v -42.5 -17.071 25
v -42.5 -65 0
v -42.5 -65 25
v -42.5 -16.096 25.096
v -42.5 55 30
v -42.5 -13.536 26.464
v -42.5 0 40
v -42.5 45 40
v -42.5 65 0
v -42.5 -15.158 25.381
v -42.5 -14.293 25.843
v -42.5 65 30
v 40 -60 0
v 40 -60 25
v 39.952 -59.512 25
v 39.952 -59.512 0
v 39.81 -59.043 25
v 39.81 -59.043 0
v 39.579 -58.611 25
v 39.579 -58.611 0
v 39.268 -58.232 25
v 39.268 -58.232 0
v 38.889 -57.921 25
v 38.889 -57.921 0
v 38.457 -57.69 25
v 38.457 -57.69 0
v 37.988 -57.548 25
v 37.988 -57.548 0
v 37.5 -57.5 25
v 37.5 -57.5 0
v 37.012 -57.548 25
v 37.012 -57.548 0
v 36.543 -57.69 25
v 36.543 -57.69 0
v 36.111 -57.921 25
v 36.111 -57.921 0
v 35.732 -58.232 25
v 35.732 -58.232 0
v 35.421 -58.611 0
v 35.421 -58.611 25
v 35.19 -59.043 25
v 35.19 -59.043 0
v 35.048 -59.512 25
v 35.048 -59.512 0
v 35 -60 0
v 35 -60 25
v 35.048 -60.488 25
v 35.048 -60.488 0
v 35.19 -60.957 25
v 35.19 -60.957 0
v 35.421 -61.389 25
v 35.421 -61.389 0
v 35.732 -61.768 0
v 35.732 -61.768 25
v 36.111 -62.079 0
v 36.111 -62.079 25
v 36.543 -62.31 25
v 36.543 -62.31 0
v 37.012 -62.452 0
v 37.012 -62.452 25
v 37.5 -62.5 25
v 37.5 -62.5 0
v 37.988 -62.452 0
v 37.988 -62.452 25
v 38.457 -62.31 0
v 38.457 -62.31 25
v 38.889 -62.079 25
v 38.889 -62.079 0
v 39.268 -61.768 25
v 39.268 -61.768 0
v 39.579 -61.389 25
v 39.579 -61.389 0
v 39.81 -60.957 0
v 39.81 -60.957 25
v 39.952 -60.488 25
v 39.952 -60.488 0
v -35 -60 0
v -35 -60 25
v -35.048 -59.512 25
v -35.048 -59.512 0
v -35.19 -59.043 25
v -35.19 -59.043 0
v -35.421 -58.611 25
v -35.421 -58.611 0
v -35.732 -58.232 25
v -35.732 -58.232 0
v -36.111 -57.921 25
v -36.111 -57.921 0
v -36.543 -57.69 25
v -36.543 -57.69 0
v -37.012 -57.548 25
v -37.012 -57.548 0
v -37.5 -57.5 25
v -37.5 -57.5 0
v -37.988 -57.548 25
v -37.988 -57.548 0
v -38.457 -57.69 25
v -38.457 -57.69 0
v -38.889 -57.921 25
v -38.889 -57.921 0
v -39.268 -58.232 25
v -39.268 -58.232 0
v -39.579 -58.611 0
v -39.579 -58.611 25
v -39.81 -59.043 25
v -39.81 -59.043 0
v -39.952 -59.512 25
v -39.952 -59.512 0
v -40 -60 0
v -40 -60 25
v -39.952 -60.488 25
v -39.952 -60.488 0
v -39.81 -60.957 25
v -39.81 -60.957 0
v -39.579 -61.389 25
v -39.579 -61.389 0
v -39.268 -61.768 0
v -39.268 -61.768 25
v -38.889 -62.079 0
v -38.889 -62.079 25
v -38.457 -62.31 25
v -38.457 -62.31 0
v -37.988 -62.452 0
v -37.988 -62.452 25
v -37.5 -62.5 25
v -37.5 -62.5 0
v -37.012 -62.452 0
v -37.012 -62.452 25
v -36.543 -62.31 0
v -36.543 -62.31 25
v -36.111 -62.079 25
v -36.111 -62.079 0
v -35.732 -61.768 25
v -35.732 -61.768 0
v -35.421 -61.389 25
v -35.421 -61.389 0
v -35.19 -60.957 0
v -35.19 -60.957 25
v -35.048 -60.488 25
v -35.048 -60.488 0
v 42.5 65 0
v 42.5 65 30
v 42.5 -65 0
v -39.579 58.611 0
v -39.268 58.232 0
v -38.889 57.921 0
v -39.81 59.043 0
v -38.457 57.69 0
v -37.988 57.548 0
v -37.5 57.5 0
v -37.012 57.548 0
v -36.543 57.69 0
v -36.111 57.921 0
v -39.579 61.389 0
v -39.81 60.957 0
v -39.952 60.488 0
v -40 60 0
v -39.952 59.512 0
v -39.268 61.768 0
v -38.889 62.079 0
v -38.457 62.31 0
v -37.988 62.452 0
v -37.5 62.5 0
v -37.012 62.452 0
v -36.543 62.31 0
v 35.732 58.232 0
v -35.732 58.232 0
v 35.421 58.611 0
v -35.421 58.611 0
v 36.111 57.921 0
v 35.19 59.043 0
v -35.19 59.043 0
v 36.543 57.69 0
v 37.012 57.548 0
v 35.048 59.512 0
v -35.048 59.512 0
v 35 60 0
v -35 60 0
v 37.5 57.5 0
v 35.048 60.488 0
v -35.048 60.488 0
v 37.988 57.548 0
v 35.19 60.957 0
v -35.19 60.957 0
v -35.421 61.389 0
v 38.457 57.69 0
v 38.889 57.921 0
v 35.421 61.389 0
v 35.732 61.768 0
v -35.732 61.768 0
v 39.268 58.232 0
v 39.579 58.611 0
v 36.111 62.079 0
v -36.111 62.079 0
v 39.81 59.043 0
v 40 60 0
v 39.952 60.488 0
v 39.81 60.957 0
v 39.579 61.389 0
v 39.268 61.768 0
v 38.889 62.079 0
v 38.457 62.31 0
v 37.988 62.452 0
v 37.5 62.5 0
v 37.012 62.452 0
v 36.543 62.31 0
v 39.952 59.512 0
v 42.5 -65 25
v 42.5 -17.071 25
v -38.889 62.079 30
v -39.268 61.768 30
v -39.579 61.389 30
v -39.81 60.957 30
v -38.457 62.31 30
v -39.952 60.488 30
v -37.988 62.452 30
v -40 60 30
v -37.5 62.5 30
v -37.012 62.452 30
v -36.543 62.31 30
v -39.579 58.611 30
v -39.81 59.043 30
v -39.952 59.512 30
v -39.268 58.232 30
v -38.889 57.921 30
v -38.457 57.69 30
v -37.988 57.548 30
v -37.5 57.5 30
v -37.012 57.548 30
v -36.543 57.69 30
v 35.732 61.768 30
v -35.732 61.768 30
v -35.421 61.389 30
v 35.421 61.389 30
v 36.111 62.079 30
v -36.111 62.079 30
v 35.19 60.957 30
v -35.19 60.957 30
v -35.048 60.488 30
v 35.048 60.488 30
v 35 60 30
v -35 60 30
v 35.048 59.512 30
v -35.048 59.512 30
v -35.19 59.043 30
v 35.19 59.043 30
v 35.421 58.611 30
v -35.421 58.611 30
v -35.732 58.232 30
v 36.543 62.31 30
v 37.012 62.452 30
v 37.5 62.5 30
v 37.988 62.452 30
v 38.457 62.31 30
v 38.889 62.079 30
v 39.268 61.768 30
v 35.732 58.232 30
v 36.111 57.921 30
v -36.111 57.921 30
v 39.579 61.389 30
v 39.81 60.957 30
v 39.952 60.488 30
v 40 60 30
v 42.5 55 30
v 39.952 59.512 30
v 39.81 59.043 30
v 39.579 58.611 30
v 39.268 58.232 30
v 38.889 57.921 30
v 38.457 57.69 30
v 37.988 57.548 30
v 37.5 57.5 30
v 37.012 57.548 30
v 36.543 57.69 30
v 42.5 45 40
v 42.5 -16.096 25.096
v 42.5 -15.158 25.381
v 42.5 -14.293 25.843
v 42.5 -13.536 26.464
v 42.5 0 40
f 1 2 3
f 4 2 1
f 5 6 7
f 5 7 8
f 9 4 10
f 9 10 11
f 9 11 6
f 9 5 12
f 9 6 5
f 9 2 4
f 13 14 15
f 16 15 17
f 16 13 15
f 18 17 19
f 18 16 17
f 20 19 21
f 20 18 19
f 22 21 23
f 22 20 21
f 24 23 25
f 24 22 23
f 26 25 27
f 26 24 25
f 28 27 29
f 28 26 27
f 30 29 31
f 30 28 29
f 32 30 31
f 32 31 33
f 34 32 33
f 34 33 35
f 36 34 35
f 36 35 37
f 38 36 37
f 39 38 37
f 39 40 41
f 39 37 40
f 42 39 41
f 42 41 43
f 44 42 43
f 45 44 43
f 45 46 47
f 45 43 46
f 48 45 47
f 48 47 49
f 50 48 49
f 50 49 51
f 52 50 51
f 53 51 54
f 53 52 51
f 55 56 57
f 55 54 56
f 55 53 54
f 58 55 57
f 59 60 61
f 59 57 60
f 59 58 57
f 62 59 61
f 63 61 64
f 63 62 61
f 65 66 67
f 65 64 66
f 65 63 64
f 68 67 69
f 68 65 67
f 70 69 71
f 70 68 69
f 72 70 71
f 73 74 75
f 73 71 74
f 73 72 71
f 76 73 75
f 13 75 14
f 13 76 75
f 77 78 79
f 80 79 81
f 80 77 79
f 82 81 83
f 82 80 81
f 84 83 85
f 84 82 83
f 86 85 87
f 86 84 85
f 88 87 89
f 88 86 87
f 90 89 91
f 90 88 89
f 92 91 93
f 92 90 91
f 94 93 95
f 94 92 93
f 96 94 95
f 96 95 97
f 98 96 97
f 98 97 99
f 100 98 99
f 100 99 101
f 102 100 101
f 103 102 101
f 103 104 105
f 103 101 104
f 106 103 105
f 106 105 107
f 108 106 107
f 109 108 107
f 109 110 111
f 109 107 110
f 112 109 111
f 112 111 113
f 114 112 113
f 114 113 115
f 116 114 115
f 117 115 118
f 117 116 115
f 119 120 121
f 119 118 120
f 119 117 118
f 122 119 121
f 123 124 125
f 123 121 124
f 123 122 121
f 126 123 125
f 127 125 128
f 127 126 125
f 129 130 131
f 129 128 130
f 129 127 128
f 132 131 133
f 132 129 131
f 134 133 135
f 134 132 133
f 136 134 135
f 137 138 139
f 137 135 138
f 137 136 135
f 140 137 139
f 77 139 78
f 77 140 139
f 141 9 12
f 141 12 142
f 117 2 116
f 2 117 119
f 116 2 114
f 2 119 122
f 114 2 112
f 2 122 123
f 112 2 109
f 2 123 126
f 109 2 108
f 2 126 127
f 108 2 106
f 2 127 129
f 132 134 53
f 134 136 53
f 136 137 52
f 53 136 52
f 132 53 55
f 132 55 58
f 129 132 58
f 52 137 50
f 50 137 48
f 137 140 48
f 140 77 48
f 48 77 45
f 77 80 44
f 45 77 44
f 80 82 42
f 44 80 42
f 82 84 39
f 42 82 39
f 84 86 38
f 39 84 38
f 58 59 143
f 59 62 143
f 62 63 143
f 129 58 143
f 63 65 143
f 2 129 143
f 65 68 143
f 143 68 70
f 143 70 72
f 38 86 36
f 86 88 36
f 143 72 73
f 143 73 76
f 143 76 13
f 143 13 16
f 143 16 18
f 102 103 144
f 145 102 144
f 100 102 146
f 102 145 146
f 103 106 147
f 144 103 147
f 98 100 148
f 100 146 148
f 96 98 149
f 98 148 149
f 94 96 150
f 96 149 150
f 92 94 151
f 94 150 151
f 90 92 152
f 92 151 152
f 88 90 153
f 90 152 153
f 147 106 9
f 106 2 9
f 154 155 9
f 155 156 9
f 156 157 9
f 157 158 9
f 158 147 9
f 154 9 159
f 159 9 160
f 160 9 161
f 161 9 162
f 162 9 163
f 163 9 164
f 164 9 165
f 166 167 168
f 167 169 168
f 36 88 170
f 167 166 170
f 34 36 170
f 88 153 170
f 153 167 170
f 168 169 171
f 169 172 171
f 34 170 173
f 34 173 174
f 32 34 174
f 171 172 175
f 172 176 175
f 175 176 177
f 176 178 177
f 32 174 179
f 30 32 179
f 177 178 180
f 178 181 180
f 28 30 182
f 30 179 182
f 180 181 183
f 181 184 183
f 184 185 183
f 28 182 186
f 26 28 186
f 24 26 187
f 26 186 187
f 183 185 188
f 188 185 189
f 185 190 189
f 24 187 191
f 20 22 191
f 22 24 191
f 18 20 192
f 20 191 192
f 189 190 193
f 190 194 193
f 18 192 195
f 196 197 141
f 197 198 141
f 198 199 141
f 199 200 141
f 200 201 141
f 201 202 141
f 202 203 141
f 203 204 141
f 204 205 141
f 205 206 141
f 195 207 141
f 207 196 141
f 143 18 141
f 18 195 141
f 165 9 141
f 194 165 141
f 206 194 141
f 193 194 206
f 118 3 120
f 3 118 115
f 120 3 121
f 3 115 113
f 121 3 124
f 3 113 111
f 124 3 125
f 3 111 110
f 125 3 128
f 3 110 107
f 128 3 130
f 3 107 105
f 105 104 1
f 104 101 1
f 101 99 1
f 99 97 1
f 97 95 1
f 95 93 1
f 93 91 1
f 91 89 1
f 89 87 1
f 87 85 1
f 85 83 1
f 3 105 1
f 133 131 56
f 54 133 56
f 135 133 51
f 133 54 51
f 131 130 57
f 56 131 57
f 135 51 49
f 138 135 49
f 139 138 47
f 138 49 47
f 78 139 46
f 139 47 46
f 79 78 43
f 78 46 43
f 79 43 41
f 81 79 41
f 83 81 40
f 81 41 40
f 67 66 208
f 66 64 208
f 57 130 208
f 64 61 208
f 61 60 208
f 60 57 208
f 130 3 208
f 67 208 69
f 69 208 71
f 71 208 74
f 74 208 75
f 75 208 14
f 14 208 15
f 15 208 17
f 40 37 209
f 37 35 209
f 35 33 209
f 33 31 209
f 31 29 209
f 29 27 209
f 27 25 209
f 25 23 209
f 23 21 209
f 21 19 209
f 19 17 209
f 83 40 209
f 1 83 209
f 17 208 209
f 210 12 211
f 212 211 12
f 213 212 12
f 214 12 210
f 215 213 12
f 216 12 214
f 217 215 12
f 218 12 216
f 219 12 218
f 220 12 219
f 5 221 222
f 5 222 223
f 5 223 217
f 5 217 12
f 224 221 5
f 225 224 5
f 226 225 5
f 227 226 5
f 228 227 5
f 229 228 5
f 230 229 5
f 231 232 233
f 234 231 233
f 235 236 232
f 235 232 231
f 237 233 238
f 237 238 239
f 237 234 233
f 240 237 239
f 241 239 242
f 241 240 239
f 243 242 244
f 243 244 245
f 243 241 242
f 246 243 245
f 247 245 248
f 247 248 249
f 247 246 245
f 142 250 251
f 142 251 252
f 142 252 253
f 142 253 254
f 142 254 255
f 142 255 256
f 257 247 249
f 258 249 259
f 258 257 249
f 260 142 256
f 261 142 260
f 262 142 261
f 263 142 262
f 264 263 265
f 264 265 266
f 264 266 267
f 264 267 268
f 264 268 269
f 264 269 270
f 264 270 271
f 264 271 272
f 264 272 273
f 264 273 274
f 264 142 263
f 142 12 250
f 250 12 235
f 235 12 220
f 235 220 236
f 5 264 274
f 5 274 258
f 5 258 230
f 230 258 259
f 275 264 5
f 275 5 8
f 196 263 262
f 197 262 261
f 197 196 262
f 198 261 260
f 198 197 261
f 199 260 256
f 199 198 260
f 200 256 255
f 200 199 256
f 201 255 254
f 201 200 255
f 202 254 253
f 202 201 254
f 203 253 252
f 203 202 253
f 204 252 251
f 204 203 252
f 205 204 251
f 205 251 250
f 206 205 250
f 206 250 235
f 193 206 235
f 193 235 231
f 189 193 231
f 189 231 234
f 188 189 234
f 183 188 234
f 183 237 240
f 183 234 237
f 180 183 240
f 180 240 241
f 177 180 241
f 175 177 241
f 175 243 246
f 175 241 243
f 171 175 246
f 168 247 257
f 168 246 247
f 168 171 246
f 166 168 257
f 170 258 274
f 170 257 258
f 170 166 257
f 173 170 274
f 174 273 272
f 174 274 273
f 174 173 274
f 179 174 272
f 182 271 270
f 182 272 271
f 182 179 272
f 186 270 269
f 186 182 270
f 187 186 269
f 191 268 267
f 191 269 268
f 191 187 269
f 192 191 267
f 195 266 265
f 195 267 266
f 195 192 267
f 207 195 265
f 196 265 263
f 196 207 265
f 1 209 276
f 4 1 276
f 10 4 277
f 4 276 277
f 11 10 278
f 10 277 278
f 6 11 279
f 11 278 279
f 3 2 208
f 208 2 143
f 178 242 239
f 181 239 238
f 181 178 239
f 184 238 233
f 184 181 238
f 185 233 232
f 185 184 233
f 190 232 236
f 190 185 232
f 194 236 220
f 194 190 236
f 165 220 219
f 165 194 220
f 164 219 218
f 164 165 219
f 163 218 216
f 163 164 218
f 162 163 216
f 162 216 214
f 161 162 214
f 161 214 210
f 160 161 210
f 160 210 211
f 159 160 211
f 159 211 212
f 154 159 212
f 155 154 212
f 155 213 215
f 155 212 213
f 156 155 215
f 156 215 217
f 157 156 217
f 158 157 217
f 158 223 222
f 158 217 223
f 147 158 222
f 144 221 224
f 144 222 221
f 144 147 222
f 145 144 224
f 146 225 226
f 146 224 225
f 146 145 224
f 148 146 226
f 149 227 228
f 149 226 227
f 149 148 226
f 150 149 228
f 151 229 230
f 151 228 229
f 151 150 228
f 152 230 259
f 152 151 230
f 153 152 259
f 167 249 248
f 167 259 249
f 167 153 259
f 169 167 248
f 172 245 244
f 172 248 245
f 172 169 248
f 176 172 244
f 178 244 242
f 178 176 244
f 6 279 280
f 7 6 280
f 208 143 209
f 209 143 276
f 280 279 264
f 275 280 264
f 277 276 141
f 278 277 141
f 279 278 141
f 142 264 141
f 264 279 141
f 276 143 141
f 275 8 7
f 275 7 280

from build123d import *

# Parameters (mm, degrees)
SCHIZZO1_W                   = 85
SCHIZZO1_H                   = 130
SCHIZZO1_R                   = 2.5
ESTRUSIONE_ESTRUSIONE1_DEPTH = 40
TAGLIO_ESTRUSIONE1_DEPTH     = 115.236596588


with BuildPart() as part:
    # Schizzo1 → Estrusione-Estrusione1 (new body)
    with BuildSketch(Plane.XY):
        Rectangle(SCHIZZO1_W, SCHIZZO1_H)
        with Locations((-37.5, 60)):
            Circle(SCHIZZO1_R, mode=Mode.SUBTRACT)
        with Locations((37.5, 60)):
            Circle(SCHIZZO1_R, mode=Mode.SUBTRACT)
        with Locations((37.5, -60)):
            Circle(SCHIZZO1_R, mode=Mode.SUBTRACT)
        with Locations((-37.5, -60)):
            Circle(SCHIZZO1_R, mode=Mode.SUBTRACT)
    extrude(amount=ESTRUSIONE_ESTRUSIONE1_DEPTH)

    # Schizzo2 → Taglio-Estrusione1 (cut, through all)
    with BuildSketch(Plane(origin=(42.5, 0, 0), x_dir=(0, 0, -1), z_dir=(1, 0, 0))):
        Polygon((-40, 65), (-30, 65), (-30, 55), (-40, 45), align=None)
        with BuildLine():
            Line((-40, 0), (-40, -65))
            Line((-40, -65), (-25, -65))
            Line((-25, -65), (-25, -17.071067812))
            ThreePointArc((-25, -17.071067812), (-25.380602337, -15.15765065), (-26.464466094, -13.535533906))
            Line((-26.464466094, -13.535533906), (-40, 0))
        make_face()
    extrude(amount=-TAGLIO_ESTRUSIONE1_DEPTH, mode=Mode.SUBTRACT)


solid = part.part
